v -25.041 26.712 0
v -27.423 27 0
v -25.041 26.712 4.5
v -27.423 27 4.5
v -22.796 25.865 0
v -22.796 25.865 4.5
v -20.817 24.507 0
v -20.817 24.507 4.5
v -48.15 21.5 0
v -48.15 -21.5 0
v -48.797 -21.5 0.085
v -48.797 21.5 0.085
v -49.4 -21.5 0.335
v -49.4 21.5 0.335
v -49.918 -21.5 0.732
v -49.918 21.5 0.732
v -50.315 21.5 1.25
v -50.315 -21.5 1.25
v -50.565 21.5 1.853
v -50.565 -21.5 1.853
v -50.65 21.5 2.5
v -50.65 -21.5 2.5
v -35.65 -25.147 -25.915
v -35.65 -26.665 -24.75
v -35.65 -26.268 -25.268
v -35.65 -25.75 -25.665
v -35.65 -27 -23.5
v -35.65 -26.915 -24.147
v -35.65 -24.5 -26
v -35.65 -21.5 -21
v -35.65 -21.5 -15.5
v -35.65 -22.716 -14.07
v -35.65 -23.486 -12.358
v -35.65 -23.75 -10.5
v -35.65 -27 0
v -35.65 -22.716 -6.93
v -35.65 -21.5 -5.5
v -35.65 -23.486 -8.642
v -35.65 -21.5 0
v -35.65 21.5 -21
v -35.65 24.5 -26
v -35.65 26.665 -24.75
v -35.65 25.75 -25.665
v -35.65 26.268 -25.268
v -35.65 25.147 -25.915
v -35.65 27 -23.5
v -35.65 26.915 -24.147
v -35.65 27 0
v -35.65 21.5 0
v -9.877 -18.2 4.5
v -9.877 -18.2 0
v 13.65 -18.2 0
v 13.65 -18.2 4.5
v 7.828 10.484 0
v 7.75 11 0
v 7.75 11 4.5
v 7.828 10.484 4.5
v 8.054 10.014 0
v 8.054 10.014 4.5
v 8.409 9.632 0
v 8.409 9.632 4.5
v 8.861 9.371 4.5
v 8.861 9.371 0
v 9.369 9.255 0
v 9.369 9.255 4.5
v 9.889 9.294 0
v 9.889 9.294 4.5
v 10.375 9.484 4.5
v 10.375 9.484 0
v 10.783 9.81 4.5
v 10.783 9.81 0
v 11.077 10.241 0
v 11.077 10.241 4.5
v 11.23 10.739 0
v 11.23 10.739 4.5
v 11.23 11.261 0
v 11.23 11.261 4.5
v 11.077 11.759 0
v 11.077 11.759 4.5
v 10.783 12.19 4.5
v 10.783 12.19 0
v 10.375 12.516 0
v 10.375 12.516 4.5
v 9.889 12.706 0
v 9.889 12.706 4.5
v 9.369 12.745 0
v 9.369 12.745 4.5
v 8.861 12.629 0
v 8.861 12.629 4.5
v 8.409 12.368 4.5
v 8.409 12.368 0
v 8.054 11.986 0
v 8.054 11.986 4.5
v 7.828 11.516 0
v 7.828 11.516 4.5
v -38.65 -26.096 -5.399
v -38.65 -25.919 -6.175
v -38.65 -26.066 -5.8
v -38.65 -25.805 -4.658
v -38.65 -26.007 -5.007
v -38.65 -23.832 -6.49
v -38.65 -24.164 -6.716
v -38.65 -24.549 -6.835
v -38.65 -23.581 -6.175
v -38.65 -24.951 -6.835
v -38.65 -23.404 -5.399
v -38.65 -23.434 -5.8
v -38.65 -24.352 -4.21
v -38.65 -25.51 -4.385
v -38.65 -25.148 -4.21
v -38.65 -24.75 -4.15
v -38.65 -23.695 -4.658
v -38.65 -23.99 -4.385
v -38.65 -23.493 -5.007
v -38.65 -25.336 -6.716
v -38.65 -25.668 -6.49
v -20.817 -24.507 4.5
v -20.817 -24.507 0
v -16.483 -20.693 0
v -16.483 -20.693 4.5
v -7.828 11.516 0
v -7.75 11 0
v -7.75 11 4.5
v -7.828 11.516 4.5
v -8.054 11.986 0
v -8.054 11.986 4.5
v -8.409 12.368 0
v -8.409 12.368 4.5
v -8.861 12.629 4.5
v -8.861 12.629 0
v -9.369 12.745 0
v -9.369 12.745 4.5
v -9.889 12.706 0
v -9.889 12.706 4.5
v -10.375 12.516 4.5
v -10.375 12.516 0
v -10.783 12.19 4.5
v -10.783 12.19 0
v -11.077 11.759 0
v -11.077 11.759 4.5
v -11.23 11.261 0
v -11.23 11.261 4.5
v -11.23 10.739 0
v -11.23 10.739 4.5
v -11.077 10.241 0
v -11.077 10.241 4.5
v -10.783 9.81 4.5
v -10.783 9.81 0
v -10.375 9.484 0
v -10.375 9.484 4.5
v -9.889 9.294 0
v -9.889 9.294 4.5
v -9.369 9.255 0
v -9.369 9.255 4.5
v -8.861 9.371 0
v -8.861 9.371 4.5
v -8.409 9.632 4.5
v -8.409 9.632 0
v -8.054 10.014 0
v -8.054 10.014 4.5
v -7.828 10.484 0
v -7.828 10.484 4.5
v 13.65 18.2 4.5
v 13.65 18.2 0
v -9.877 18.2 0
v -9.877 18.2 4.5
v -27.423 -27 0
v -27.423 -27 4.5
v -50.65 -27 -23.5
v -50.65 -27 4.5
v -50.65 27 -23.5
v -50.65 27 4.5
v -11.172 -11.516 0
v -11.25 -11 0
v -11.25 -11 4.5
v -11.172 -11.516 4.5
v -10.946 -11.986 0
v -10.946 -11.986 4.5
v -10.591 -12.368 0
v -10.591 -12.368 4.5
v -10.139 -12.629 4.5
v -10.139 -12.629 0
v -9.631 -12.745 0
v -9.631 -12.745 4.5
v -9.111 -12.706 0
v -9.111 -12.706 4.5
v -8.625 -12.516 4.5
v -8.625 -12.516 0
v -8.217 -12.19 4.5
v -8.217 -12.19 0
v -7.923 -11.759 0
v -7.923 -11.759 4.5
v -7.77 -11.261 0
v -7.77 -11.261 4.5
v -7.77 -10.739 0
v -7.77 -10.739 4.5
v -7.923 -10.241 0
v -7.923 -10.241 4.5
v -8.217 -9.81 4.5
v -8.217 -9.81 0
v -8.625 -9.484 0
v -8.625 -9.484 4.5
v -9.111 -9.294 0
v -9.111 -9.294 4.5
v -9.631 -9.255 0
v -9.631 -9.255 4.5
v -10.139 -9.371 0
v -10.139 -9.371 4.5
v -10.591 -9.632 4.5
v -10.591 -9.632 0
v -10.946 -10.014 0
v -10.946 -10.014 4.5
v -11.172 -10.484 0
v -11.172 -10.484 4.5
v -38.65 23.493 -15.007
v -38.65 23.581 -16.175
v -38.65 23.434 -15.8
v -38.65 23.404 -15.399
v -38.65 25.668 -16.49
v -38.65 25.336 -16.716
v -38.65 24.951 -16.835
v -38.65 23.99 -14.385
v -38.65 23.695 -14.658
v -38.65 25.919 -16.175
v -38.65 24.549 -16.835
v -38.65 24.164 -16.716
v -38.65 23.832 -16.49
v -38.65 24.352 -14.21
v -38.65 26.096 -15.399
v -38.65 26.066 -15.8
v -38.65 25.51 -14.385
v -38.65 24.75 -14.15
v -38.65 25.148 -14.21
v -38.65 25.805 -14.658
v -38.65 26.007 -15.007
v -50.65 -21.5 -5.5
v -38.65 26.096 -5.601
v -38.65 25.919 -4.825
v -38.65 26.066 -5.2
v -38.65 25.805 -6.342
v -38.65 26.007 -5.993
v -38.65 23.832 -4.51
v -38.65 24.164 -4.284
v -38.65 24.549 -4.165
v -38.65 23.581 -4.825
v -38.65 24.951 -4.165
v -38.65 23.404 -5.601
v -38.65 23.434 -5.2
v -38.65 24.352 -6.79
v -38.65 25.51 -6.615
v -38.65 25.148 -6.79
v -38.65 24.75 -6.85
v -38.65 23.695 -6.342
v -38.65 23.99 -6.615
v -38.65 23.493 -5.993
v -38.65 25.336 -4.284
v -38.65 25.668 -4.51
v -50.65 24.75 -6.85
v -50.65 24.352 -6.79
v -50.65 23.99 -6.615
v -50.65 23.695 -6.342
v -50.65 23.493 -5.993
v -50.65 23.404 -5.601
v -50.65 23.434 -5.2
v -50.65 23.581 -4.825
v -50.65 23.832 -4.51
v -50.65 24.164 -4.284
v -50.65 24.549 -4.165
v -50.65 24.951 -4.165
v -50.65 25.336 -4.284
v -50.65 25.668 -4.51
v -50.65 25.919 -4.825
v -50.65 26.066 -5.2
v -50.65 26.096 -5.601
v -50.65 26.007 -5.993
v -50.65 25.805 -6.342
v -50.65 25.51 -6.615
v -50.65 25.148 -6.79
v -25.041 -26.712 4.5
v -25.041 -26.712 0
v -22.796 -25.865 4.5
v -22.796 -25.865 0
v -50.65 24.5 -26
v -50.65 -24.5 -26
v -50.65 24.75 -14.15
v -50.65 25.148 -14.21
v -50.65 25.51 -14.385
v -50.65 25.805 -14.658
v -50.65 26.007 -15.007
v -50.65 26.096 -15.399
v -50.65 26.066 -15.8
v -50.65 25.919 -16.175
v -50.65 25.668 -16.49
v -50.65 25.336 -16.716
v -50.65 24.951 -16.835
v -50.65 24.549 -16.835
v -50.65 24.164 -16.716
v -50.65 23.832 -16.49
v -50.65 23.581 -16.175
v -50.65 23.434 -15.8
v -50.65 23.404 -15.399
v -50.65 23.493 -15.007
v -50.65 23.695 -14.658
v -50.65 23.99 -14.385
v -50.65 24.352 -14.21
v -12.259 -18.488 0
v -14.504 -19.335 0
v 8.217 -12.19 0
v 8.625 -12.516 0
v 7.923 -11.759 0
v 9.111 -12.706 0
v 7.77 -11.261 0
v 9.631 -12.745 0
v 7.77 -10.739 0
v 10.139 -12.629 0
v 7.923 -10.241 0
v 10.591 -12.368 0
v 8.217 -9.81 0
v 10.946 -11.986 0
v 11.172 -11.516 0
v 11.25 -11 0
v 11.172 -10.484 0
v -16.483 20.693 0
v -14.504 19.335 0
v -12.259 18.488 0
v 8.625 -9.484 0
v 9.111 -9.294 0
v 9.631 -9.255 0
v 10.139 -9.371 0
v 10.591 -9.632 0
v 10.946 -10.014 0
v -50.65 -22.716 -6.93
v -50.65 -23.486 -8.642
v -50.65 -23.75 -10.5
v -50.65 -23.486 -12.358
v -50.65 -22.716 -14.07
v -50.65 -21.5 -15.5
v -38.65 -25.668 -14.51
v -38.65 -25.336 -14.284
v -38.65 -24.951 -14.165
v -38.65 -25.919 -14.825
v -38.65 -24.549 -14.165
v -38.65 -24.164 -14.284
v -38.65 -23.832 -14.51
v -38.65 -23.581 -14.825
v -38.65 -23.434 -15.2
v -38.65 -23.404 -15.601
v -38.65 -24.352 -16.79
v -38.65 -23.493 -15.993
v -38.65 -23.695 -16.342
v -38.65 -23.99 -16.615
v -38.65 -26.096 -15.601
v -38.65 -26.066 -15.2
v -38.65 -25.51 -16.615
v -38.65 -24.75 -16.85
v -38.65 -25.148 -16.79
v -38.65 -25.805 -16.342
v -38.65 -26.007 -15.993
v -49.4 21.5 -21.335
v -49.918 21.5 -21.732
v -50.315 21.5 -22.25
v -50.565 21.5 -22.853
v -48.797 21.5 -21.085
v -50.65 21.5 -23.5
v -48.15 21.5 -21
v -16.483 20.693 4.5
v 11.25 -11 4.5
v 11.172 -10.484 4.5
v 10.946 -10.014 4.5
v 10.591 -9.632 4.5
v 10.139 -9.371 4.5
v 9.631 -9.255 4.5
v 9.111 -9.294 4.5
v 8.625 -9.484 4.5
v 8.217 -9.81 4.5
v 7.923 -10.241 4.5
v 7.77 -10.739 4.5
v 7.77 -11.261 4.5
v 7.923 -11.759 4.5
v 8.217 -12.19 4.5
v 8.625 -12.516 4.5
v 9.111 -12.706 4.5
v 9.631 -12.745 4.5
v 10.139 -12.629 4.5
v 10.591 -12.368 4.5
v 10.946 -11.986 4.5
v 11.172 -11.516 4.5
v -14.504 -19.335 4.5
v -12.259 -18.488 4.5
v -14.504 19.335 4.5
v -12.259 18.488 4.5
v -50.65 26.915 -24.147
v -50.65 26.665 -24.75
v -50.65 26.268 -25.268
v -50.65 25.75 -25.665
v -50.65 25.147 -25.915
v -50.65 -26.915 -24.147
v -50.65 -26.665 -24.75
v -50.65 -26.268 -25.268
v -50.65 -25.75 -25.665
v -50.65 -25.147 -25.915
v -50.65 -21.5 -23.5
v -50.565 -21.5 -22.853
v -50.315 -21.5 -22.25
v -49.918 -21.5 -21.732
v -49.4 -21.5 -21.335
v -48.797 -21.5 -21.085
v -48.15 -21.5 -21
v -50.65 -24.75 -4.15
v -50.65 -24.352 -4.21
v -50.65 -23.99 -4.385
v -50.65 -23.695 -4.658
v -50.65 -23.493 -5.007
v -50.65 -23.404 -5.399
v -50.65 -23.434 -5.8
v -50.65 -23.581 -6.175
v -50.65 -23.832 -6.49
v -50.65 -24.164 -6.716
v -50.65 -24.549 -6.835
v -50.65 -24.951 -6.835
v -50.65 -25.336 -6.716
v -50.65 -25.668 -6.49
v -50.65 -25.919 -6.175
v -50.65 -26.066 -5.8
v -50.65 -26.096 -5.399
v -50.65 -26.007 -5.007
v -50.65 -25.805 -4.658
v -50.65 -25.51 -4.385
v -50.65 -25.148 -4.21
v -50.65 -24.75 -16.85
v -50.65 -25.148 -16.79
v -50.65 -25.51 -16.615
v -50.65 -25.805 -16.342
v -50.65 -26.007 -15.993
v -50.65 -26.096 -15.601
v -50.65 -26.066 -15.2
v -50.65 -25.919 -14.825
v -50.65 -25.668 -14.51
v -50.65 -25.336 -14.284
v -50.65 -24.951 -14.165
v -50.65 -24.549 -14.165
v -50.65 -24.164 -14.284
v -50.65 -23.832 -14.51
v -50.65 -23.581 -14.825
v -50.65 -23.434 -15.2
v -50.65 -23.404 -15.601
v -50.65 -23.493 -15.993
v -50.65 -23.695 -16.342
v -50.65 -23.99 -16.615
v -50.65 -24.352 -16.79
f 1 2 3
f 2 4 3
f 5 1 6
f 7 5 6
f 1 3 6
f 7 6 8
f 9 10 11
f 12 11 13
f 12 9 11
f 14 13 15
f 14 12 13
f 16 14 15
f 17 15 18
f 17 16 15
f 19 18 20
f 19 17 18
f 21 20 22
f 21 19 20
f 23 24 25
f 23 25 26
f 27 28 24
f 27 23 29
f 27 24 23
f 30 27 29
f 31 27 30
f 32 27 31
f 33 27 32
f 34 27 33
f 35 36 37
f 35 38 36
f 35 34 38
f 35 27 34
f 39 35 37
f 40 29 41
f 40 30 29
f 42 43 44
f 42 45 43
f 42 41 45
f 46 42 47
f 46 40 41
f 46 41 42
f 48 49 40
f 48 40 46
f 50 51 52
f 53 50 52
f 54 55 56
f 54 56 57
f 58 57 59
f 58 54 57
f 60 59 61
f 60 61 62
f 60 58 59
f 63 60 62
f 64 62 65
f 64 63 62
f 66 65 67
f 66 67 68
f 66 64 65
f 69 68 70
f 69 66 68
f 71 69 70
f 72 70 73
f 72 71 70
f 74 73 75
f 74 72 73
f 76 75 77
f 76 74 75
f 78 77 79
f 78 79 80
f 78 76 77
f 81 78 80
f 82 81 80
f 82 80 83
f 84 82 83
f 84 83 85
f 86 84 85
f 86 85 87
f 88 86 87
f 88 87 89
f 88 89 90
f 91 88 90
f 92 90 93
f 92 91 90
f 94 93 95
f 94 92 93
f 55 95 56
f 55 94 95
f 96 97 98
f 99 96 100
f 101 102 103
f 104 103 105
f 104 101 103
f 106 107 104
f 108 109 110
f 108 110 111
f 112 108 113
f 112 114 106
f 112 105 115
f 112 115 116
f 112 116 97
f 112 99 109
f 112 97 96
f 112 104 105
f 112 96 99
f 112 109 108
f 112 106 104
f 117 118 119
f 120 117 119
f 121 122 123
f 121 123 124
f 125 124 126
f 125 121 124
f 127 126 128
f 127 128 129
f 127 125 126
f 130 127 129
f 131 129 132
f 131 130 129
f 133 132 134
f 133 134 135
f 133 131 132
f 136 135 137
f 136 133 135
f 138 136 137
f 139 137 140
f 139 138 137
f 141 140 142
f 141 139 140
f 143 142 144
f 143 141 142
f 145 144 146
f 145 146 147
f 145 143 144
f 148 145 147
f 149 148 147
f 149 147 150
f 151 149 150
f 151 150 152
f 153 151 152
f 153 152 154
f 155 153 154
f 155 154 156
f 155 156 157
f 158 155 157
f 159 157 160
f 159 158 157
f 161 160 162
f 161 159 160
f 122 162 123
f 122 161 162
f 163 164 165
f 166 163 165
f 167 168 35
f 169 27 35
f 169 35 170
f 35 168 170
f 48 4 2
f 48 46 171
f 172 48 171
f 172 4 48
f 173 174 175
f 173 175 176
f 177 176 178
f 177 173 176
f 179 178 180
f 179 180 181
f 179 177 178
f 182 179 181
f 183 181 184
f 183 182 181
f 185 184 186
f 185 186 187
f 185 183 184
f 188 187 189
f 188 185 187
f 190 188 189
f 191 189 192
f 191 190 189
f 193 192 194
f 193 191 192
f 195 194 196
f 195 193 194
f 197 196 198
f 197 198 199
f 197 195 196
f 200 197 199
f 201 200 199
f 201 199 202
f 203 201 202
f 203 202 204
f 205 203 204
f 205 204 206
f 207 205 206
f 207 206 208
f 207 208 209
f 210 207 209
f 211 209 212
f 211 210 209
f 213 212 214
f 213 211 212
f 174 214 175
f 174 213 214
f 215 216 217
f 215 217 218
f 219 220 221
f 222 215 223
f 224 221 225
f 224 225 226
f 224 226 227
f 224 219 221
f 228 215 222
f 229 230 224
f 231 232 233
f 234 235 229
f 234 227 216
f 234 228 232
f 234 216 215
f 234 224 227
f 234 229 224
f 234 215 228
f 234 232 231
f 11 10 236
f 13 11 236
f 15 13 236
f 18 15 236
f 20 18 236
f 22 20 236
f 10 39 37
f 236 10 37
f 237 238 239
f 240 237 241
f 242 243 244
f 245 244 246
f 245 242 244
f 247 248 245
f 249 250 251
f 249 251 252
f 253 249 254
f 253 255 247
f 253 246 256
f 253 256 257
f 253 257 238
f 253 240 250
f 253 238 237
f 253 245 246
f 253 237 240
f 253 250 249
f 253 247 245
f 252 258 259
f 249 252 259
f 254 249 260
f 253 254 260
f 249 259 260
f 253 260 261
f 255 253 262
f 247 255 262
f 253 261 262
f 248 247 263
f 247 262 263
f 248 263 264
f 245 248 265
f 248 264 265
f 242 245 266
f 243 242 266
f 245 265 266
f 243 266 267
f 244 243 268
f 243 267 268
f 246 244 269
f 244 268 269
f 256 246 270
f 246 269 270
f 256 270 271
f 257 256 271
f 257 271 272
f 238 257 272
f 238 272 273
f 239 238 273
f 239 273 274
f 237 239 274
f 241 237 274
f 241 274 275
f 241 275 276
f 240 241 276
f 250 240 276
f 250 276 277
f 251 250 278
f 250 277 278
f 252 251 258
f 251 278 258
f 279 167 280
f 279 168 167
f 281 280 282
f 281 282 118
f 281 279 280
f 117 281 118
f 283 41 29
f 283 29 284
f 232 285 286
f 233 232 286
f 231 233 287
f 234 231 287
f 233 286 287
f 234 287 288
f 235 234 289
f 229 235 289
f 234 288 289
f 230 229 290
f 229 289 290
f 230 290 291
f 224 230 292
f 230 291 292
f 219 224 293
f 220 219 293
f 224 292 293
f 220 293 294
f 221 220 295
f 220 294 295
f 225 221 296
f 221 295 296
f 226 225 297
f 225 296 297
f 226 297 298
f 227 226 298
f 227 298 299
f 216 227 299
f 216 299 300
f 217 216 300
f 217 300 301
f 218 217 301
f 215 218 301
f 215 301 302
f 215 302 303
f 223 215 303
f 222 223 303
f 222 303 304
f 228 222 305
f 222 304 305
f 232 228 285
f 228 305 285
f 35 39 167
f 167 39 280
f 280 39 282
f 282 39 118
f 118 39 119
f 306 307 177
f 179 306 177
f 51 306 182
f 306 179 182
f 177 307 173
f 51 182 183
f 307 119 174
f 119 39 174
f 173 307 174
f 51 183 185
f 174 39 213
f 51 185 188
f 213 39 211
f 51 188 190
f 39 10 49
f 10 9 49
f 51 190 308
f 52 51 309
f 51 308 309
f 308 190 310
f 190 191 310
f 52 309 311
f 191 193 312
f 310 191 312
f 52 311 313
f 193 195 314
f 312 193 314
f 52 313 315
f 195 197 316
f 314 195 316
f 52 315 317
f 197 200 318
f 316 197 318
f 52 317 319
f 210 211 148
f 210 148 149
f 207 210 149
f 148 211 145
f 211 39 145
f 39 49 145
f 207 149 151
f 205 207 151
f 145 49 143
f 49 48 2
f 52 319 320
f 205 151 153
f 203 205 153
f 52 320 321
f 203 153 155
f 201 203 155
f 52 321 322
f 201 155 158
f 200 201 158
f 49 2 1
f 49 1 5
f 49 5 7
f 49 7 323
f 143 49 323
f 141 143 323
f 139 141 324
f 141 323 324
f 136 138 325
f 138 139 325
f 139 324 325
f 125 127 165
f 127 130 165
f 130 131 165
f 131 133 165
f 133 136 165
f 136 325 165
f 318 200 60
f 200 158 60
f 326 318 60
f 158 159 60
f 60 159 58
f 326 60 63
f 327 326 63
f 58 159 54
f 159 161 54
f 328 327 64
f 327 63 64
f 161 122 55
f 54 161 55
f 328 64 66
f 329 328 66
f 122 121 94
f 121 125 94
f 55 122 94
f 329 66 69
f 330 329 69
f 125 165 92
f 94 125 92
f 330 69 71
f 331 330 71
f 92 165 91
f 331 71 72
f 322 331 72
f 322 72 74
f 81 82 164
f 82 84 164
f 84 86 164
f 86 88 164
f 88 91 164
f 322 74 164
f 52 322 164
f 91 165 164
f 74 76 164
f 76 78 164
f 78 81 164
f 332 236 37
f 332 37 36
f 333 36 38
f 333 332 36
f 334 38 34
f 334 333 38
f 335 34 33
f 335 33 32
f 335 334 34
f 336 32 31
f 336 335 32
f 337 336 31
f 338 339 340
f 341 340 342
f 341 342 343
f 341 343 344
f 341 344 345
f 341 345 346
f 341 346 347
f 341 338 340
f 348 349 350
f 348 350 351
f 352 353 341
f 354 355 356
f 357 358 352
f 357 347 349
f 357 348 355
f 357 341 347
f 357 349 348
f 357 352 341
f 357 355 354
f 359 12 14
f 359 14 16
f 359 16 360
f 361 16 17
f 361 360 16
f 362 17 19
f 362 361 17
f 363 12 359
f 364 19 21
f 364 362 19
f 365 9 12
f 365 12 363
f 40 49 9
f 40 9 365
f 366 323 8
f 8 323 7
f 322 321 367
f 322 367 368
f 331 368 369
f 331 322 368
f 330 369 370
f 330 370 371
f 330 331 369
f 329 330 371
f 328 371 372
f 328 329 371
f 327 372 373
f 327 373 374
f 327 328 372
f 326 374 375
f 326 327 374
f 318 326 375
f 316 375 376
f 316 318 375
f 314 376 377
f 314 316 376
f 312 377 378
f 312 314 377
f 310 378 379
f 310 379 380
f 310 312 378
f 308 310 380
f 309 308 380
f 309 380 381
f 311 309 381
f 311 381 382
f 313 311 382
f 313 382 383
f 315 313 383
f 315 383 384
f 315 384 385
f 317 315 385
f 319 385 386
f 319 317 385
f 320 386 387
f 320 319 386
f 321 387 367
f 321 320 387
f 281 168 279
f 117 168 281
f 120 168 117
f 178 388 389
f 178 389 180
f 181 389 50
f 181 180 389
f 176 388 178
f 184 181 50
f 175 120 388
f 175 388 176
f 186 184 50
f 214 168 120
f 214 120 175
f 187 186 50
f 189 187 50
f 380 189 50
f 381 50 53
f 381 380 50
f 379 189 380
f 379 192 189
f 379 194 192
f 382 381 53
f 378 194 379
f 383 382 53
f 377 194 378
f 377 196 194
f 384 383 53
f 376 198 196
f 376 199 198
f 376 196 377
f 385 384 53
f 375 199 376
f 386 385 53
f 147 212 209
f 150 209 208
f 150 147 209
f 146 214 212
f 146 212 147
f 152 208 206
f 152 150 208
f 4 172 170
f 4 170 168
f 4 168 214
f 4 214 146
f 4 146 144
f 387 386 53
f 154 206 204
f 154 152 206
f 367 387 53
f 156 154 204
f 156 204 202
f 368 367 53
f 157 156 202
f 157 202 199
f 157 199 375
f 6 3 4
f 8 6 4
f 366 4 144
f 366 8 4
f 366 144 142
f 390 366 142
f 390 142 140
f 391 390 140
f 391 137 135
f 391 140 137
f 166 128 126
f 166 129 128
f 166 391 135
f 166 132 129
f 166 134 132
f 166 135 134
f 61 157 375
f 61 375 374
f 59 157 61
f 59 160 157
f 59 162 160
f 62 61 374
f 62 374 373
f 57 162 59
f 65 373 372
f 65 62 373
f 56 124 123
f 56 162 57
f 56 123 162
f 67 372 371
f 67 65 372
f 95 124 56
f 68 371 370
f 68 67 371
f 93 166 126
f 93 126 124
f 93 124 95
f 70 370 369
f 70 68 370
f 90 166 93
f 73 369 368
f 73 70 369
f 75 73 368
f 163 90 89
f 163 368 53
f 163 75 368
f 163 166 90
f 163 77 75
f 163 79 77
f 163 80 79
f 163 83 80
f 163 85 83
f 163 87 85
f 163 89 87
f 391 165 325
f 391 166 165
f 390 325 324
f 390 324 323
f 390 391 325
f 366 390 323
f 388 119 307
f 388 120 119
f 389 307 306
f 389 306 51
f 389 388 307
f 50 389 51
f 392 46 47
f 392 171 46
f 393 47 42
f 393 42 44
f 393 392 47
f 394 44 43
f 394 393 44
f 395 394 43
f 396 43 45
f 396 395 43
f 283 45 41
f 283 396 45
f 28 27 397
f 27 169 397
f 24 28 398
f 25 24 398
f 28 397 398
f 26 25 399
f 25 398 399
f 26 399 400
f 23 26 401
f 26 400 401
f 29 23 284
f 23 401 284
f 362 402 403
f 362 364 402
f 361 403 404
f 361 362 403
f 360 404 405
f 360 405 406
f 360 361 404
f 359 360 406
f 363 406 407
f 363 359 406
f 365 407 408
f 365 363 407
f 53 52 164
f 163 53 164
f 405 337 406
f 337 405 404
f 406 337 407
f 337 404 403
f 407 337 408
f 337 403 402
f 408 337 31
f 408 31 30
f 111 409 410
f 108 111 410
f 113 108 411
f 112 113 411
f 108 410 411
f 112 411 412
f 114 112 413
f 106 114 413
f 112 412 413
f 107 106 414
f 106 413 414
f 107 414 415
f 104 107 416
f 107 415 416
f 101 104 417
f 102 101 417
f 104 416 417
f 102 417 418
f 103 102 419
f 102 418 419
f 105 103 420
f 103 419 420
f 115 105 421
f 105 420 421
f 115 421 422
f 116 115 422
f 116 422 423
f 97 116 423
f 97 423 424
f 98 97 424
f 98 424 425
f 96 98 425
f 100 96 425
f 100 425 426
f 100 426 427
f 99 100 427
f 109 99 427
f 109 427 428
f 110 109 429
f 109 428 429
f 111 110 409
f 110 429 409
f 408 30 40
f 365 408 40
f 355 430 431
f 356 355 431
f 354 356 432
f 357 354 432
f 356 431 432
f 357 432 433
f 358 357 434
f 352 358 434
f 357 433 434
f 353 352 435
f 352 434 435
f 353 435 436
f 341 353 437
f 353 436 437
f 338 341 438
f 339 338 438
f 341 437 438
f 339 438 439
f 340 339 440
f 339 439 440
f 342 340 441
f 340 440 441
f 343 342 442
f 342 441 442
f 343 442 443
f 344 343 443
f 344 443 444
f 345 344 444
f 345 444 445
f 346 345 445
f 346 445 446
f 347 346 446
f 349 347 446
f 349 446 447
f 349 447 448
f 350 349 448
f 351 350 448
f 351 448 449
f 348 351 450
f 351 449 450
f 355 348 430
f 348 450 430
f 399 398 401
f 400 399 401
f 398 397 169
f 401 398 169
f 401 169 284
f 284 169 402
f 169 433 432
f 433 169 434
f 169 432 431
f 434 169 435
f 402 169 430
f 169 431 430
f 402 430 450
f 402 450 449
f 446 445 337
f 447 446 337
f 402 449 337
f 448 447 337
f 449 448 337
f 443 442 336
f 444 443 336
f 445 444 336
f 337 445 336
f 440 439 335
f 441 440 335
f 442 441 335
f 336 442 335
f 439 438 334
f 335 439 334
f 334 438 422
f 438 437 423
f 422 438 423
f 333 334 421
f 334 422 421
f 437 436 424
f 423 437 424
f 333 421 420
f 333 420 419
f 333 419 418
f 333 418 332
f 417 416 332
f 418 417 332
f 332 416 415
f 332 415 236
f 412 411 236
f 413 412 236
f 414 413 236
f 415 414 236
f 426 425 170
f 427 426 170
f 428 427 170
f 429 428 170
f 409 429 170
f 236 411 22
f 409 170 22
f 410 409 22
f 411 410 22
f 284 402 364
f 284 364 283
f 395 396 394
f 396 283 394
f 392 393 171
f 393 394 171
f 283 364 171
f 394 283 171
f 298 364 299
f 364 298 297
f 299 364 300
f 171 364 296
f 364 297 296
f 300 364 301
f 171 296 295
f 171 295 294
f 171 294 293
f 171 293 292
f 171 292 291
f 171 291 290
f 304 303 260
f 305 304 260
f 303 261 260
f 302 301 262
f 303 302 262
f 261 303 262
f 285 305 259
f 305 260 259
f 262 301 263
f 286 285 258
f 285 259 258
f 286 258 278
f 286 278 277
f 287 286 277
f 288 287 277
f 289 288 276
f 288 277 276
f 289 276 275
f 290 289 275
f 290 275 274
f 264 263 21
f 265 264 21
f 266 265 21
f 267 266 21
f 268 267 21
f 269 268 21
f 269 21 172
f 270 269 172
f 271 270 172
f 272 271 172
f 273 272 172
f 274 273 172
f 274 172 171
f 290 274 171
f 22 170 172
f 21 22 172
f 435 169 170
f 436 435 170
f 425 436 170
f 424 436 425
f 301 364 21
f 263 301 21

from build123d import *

# Parameters (mm, degrees)
SKETCH1_R           = 1.75
BOSS_EXTRUDE1_DEPTH = 4.5
SKETCH2_W           = 15
SKETCH2_H           = 54
BOSS_EXTRUDE2_DEPTH = 26
SKETCH5_W           = 21
SKETCH5_H           = 43
CUT_EXTRUDE1_DEPTH  = 15
SKETCH6_R           = 1.35
CUT_EXTRUDE2_DEPTH  = 12
CUT_EXTRUDE3_DEPTH  = 15
FILLET1_R           = 10
FILLET3_R           = 2.5


with BuildPart() as part:
    # Sketch1 → Boss-Extrude1 (new body)
    with BuildSketch(Plane.XY):
        Polygon((-13.65, -18.2), (13.65, -18.2), (13.65, 18.2), (-13.65, 18.2), (-23.65, 27), (-50.65, 27), (-50.65, -27), (-23.65, -27), align=None)
        with Locations((-9.5, 11)):
            Circle(SKETCH1_R, mode=Mode.SUBTRACT)
        with Locations(Location((9.5, 11, 0), (0, 0, 180))):
            Circle(SKETCH1_R, mode=Mode.SUBTRACT)
        with Locations(Location((-9.5, -11, 0), (0, 0, 180))):
            Circle(SKETCH1_R, mode=Mode.SUBTRACT)
        with Locations((9.5, -11)):
            Circle(SKETCH1_R, mode=Mode.SUBTRACT)
    extrude(amount=BOSS_EXTRUDE1_DEPTH)

    # Sketch2 → Boss-Extrude2 (add)
    with BuildSketch(Plane(origin=(0, 0, 0), x_dir=(-1, 0, 0), z_dir=(0, 0, -1))):
        with Locations((43.15, 0)):
            Rectangle(SKETCH2_W, SKETCH2_H)
    extrude(amount=BOSS_EXTRUDE2_DEPTH)

    # Sketch5 → Cut-Extrude1 (cut)
    with BuildSketch(Plane(origin=(-35.65, 0, 0), x_dir=(0, 0, -1), z_dir=(1, 0, 0))):
        with Locations((10.5, 0)):
            Rectangle(SKETCH5_W, SKETCH5_H)
    extrude(amount=-CUT_EXTRUDE1_DEPTH, mode=Mode.SUBTRACT)

    # Sketch6 → Cut-Extrude2 (cut)
    with BuildSketch(Plane.ZY.offset(50.65)):
        with Locations((-15.5, 24.75)):
            Circle(SKETCH6_R)
        with Locations(Location((-5.5, 24.75, 0), (0, 0, 180))):
            Circle(SKETCH6_R)
        with Locations((-5.5, -24.75)):
            Circle(SKETCH6_R)
        with Locations(Location((-15.5, -24.75, 0), (0, 0, 180))):
            Circle(SKETCH6_R)
    extrude(amount=-CUT_EXTRUDE2_DEPTH, mode=Mode.SUBTRACT)

    # Sketch8 → Cut-Extrude3 (cut)
    with BuildSketch(Plane.ZY.offset(50.65)):
        with BuildLine():
            Line((-15.5, -21.5), (-5.5, -21.5))
            ThreePointArc((-5.5, -21.5), (-10.5, -23.75), (-15.5, -21.5))
        make_face()
    extrude(amount=-CUT_EXTRUDE3_DEPTH, mode=Mode.SUBTRACT)

    # Fillet1
    fillet1_edges = [part.edges().sort_by_distance(p)[0] for p in [
        (-13.65, -18.2, 2.25),
        (-23.65, -27, 2.25),
        (-23.65, 27, 2.25),
        (-13.65, 18.2, 2.25),
    ]]
    fillet(fillet1_edges, radius=FILLET1_R)

    # Fillet3
    fillet3_edges = [part.edges().sort_by_distance(p)[0] for p in [
        (-43.15, 27, -26),
        (-43.15, -27, -26),
        (-50.65, 0, 0),
        (-50.65, 0, -21),
    ]]
    fillet(fillet3_edges, radius=FILLET3_R - 0.0001)  # a hair under: the kernel refuses the full size


solid = part.part
